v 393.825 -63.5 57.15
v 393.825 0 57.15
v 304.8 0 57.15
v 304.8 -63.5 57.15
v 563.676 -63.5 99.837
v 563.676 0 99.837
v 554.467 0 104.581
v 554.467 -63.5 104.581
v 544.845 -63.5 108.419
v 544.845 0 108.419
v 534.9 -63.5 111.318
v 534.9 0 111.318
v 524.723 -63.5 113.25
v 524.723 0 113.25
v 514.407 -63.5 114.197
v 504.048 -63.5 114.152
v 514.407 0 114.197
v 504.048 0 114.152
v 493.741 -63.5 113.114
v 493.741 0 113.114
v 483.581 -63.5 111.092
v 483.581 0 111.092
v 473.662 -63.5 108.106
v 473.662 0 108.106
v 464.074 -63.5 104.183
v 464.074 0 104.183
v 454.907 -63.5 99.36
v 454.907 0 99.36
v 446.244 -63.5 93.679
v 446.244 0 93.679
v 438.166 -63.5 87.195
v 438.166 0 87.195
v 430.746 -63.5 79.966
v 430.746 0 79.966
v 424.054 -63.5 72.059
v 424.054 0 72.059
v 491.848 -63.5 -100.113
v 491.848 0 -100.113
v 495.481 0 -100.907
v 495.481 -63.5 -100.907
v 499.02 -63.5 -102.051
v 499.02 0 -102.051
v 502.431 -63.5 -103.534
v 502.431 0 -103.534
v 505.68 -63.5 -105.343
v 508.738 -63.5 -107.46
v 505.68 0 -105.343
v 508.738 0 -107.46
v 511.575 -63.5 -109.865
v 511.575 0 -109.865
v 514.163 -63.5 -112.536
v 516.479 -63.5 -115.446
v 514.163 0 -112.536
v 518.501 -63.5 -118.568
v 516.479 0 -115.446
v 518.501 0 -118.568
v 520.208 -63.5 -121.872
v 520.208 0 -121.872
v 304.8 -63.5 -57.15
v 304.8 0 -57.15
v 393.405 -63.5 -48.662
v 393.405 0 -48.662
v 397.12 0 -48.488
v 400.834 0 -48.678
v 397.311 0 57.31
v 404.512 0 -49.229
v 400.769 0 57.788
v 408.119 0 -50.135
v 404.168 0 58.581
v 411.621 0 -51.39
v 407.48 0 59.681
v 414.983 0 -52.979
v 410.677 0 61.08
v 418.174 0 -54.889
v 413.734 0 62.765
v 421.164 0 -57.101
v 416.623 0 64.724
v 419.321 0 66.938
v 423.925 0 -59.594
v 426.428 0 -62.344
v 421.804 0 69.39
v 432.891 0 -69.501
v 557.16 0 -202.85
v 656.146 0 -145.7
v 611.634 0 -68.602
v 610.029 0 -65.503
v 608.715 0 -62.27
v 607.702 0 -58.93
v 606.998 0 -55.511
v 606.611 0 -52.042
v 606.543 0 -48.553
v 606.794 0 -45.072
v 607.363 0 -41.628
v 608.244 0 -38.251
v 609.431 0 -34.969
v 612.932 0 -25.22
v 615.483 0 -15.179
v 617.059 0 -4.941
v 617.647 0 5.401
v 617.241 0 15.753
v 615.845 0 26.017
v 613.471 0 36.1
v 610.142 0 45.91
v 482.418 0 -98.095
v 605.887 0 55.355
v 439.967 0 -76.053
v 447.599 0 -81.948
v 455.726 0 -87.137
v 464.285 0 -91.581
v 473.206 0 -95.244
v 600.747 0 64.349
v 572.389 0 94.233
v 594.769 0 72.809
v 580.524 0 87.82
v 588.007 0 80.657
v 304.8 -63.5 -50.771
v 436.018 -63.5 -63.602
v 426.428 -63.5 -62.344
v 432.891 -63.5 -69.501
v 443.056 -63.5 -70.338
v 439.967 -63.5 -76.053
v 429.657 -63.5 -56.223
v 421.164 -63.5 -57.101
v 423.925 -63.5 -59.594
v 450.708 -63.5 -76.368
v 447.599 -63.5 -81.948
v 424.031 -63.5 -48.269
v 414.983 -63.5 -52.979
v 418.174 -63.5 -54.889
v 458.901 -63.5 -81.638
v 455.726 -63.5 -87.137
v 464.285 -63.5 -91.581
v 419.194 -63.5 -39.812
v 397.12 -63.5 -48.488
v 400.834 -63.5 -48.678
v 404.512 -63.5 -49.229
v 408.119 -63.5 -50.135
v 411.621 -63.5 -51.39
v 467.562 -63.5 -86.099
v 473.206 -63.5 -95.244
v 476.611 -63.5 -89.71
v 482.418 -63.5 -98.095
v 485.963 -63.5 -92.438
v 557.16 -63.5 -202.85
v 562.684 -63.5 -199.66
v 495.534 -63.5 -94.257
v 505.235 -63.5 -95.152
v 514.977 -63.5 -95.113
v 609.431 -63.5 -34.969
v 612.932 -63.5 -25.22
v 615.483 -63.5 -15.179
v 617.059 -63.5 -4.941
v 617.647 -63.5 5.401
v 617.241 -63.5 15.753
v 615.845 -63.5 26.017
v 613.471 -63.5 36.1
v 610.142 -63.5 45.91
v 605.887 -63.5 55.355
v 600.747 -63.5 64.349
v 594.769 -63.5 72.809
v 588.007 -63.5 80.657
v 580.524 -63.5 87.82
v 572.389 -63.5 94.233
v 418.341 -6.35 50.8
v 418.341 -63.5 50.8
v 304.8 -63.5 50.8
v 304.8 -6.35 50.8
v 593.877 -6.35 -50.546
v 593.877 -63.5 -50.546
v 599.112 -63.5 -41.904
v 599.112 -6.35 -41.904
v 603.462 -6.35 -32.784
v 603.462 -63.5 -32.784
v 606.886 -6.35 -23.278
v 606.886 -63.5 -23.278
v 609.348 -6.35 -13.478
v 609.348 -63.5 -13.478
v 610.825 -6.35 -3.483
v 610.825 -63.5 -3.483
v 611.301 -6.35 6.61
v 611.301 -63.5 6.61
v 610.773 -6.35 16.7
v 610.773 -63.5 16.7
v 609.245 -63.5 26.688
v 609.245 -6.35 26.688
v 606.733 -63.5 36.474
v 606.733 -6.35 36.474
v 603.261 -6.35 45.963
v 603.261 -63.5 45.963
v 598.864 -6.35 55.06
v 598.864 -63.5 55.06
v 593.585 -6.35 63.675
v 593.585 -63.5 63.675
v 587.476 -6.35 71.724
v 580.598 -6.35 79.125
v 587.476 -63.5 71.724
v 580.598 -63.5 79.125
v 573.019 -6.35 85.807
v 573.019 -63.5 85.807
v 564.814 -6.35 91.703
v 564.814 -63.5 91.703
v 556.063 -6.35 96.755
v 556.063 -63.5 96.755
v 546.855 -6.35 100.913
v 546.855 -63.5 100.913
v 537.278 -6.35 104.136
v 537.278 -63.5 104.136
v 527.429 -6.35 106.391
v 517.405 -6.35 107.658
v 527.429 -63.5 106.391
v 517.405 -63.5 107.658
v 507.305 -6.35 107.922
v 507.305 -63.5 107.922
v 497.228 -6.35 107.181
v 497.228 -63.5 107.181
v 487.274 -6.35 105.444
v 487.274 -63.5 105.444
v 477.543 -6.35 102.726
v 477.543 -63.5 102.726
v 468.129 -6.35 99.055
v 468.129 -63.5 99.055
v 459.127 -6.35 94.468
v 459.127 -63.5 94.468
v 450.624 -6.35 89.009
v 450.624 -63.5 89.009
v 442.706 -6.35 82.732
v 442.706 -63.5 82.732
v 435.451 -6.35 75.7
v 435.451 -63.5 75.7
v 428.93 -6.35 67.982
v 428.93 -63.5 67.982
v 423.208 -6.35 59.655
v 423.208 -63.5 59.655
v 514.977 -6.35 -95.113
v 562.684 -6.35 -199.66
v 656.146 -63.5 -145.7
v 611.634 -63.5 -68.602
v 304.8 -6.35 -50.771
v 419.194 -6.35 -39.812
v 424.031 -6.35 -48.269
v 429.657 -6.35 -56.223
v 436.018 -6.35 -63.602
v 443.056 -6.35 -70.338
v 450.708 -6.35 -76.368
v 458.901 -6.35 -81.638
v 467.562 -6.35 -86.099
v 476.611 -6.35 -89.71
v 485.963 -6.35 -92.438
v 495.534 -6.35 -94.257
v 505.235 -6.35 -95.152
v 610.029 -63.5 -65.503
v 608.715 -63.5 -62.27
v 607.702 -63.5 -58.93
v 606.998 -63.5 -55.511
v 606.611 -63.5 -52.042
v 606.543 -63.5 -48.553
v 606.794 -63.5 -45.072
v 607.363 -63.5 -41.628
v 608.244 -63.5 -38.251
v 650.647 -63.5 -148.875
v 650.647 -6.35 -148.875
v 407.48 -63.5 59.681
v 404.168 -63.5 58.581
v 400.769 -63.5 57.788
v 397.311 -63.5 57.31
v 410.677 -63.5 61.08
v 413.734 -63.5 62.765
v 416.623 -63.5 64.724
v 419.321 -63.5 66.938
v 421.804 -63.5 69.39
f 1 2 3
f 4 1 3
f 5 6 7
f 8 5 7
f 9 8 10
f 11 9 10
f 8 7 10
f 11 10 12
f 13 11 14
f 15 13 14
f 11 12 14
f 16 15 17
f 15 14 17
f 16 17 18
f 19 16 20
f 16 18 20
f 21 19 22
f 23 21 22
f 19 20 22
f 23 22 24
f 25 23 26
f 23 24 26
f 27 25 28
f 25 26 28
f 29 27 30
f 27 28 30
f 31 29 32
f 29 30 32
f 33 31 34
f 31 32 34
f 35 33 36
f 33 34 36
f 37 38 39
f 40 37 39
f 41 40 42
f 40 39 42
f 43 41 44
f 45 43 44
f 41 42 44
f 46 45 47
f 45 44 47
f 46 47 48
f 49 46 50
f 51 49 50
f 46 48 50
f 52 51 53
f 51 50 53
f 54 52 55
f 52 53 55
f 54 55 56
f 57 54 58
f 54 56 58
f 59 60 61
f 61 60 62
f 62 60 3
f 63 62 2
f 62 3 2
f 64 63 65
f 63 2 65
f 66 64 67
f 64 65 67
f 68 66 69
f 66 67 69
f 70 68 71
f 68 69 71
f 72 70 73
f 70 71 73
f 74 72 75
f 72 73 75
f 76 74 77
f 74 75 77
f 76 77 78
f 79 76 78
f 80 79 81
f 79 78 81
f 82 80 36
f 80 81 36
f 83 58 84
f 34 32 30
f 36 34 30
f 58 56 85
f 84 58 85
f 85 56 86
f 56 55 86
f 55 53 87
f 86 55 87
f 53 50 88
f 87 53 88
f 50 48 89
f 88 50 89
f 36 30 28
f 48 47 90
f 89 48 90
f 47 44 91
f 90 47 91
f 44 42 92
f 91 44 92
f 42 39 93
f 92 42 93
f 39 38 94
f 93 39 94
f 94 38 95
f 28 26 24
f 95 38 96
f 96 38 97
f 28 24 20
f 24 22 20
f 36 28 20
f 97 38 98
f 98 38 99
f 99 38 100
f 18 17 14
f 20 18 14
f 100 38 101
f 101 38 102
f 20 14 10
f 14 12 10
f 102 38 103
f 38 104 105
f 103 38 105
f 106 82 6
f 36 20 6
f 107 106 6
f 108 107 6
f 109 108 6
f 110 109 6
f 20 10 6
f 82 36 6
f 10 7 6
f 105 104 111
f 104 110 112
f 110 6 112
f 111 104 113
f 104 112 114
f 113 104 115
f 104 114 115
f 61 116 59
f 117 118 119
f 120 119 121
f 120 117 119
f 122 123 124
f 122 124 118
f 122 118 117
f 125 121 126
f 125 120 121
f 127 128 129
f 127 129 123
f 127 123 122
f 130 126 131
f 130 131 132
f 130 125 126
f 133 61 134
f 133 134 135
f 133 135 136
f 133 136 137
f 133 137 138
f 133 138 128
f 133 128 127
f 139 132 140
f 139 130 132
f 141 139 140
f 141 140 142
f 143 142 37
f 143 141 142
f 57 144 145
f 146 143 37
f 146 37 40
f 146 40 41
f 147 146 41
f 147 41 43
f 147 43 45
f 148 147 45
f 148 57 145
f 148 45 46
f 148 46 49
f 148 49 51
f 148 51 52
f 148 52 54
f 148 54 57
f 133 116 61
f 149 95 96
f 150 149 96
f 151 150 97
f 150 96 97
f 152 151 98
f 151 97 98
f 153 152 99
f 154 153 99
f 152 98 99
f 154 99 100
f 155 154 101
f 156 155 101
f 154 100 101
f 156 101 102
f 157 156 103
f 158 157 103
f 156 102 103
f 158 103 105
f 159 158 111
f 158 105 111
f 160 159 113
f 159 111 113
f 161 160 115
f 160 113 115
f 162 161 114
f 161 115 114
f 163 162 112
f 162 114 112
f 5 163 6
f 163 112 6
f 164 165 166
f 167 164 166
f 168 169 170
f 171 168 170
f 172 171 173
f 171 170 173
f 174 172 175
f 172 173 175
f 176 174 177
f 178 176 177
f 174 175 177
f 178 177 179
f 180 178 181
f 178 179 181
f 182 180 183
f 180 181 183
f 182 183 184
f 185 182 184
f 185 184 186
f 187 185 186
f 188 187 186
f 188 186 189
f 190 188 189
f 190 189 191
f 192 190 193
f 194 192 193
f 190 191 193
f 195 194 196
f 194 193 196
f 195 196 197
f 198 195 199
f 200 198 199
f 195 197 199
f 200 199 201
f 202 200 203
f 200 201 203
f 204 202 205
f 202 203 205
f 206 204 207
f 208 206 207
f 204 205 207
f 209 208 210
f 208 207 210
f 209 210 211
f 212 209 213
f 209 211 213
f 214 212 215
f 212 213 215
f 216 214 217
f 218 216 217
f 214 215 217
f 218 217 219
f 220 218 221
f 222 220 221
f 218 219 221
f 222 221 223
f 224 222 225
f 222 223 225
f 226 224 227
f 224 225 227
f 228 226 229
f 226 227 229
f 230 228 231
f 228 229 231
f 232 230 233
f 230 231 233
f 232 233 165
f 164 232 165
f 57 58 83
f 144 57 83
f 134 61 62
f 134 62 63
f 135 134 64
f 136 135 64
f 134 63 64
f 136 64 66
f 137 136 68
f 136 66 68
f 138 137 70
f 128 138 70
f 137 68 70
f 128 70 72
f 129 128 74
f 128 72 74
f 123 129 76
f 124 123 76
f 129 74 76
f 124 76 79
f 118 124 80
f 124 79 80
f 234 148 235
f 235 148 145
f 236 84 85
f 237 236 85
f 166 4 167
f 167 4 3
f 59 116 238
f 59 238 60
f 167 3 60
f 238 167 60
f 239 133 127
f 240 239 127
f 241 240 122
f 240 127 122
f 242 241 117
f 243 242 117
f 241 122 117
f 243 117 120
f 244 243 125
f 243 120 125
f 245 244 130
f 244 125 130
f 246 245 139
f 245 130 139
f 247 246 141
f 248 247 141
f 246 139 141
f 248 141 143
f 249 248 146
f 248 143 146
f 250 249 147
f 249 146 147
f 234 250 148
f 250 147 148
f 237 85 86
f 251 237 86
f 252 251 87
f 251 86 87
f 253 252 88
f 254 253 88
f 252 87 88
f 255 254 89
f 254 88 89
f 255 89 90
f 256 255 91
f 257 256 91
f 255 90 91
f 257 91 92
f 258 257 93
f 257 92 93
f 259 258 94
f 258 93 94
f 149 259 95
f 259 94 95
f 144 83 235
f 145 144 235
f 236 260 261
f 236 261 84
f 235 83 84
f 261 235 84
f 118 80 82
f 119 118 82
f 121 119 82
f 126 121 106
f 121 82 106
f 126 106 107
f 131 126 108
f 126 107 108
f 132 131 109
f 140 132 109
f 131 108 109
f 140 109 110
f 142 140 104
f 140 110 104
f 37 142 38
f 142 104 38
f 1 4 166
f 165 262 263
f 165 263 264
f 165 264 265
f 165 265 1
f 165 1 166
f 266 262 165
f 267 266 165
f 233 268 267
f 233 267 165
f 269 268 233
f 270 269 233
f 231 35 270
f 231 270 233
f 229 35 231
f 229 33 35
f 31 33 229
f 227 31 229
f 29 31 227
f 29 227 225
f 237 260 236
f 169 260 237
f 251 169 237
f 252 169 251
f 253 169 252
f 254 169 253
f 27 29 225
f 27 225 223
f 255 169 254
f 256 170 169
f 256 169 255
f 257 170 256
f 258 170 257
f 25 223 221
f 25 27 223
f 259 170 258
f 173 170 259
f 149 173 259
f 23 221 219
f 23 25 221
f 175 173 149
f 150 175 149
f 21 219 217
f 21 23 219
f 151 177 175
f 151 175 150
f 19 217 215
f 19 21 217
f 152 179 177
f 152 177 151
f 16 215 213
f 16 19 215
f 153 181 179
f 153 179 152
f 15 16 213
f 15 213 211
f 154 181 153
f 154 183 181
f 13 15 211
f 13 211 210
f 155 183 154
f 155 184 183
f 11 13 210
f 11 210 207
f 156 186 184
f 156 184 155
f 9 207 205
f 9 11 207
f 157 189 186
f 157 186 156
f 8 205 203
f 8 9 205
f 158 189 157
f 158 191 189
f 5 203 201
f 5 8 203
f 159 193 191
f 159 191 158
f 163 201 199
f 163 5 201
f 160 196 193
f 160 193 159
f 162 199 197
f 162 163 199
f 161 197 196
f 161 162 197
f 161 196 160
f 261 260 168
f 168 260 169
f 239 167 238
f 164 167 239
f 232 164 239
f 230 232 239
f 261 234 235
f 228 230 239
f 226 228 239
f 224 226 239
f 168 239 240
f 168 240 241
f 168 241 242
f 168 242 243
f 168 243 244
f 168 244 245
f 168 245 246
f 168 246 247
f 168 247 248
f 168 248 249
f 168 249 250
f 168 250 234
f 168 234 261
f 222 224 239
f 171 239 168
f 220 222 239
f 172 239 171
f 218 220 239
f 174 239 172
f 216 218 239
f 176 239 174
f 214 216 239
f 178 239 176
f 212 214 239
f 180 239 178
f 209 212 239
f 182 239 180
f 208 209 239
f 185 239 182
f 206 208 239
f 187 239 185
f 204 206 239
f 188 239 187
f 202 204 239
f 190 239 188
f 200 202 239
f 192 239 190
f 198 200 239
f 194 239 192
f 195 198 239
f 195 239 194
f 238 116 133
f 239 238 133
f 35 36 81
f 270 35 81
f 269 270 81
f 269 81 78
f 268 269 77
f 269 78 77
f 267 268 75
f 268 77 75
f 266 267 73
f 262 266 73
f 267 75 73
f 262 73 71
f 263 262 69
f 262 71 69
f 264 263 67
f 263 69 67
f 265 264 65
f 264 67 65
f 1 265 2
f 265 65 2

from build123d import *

# Parameters (mm, degrees)
F1_DEPTH = 63.5
F3_DEPTH = 57.15


with BuildPart() as f1:
    # F0 (on Front) → F1 (new body)
    with BuildSketch(Plane.XZ):
        with BuildLine():
            Line((393.824851, 57.15), (304.8, 57.15))
            Line((304.8, 57.15), (304.8, -57.15))
            Line((304.8, -57.15), (393.404788, -48.661999))
            ThreePointArc((393.404788, -48.661999), (411.620709, -51.38959), (426.428465, -62.34358))
            ThreePointArc((426.428465, -62.34358), (455.726477, -87.137442), (491.847598, -100.113334))
            ThreePointArc((491.847598, -100.113334), (508.73791, -107.460232), (520.208033, -121.871887))
            Line((520.208033, -121.871887), (557.159603, -202.849885))
            Line((557.159603, -202.849885), (656.146307, -145.699885))
            Line((656.146307, -145.699885), (611.633881, -68.602102))
            ThreePointArc((611.633881, -68.602102), (606.610921, -52.042385), (609.430848, -34.968945))
            ThreePointArc((609.430848, -34.968945), (611.924023, 41.045153), (563.676477, 99.837442))
            ThreePointArc((563.676477, 99.837442), (488.637088, 112.224898), (424.053536, 72.058696))
            ThreePointArc((424.053536, 72.058696), (410.677467, 61.079847), (393.824851, 57.15))
        make_face()
    extrude(amount=F1_DEPTH)


with BuildPart() as f3:
    # F2 (on face) → F3 (new body)
    with BuildSketch(Plane.XZ.offset(63.5)):
        with BuildLine():
            Line((293.525537, -51.85098), (419.194066, -39.812414))
            ThreePointArc((419.194066, -39.812414), (458.901477, -81.638181), (514.977359, -95.112925))
            Line((514.977359, -95.112925), (570.314071, -216.38128))
            Line((570.314071, -216.38128), (656.146307, -158.399885))
            Line((656.146307, -158.399885), (593.876602, -50.545592))
            ThreePointArc((593.876602, -50.545592), (560.501477, 94.338181), (418.340887, 50.8))
            Line((418.340887, 50.8), (288.119435, 50.8))
            Line((288.119435, 50.8), (293.525537, -51.85098))
        make_face()
    extrude(amount=-F3_DEPTH)


with BuildPart() as f1_1:
    add(f1.part)

    # F4: cut F3
    add(f3.part, mode=Mode.SUBTRACT)


solid = f1_1.part
